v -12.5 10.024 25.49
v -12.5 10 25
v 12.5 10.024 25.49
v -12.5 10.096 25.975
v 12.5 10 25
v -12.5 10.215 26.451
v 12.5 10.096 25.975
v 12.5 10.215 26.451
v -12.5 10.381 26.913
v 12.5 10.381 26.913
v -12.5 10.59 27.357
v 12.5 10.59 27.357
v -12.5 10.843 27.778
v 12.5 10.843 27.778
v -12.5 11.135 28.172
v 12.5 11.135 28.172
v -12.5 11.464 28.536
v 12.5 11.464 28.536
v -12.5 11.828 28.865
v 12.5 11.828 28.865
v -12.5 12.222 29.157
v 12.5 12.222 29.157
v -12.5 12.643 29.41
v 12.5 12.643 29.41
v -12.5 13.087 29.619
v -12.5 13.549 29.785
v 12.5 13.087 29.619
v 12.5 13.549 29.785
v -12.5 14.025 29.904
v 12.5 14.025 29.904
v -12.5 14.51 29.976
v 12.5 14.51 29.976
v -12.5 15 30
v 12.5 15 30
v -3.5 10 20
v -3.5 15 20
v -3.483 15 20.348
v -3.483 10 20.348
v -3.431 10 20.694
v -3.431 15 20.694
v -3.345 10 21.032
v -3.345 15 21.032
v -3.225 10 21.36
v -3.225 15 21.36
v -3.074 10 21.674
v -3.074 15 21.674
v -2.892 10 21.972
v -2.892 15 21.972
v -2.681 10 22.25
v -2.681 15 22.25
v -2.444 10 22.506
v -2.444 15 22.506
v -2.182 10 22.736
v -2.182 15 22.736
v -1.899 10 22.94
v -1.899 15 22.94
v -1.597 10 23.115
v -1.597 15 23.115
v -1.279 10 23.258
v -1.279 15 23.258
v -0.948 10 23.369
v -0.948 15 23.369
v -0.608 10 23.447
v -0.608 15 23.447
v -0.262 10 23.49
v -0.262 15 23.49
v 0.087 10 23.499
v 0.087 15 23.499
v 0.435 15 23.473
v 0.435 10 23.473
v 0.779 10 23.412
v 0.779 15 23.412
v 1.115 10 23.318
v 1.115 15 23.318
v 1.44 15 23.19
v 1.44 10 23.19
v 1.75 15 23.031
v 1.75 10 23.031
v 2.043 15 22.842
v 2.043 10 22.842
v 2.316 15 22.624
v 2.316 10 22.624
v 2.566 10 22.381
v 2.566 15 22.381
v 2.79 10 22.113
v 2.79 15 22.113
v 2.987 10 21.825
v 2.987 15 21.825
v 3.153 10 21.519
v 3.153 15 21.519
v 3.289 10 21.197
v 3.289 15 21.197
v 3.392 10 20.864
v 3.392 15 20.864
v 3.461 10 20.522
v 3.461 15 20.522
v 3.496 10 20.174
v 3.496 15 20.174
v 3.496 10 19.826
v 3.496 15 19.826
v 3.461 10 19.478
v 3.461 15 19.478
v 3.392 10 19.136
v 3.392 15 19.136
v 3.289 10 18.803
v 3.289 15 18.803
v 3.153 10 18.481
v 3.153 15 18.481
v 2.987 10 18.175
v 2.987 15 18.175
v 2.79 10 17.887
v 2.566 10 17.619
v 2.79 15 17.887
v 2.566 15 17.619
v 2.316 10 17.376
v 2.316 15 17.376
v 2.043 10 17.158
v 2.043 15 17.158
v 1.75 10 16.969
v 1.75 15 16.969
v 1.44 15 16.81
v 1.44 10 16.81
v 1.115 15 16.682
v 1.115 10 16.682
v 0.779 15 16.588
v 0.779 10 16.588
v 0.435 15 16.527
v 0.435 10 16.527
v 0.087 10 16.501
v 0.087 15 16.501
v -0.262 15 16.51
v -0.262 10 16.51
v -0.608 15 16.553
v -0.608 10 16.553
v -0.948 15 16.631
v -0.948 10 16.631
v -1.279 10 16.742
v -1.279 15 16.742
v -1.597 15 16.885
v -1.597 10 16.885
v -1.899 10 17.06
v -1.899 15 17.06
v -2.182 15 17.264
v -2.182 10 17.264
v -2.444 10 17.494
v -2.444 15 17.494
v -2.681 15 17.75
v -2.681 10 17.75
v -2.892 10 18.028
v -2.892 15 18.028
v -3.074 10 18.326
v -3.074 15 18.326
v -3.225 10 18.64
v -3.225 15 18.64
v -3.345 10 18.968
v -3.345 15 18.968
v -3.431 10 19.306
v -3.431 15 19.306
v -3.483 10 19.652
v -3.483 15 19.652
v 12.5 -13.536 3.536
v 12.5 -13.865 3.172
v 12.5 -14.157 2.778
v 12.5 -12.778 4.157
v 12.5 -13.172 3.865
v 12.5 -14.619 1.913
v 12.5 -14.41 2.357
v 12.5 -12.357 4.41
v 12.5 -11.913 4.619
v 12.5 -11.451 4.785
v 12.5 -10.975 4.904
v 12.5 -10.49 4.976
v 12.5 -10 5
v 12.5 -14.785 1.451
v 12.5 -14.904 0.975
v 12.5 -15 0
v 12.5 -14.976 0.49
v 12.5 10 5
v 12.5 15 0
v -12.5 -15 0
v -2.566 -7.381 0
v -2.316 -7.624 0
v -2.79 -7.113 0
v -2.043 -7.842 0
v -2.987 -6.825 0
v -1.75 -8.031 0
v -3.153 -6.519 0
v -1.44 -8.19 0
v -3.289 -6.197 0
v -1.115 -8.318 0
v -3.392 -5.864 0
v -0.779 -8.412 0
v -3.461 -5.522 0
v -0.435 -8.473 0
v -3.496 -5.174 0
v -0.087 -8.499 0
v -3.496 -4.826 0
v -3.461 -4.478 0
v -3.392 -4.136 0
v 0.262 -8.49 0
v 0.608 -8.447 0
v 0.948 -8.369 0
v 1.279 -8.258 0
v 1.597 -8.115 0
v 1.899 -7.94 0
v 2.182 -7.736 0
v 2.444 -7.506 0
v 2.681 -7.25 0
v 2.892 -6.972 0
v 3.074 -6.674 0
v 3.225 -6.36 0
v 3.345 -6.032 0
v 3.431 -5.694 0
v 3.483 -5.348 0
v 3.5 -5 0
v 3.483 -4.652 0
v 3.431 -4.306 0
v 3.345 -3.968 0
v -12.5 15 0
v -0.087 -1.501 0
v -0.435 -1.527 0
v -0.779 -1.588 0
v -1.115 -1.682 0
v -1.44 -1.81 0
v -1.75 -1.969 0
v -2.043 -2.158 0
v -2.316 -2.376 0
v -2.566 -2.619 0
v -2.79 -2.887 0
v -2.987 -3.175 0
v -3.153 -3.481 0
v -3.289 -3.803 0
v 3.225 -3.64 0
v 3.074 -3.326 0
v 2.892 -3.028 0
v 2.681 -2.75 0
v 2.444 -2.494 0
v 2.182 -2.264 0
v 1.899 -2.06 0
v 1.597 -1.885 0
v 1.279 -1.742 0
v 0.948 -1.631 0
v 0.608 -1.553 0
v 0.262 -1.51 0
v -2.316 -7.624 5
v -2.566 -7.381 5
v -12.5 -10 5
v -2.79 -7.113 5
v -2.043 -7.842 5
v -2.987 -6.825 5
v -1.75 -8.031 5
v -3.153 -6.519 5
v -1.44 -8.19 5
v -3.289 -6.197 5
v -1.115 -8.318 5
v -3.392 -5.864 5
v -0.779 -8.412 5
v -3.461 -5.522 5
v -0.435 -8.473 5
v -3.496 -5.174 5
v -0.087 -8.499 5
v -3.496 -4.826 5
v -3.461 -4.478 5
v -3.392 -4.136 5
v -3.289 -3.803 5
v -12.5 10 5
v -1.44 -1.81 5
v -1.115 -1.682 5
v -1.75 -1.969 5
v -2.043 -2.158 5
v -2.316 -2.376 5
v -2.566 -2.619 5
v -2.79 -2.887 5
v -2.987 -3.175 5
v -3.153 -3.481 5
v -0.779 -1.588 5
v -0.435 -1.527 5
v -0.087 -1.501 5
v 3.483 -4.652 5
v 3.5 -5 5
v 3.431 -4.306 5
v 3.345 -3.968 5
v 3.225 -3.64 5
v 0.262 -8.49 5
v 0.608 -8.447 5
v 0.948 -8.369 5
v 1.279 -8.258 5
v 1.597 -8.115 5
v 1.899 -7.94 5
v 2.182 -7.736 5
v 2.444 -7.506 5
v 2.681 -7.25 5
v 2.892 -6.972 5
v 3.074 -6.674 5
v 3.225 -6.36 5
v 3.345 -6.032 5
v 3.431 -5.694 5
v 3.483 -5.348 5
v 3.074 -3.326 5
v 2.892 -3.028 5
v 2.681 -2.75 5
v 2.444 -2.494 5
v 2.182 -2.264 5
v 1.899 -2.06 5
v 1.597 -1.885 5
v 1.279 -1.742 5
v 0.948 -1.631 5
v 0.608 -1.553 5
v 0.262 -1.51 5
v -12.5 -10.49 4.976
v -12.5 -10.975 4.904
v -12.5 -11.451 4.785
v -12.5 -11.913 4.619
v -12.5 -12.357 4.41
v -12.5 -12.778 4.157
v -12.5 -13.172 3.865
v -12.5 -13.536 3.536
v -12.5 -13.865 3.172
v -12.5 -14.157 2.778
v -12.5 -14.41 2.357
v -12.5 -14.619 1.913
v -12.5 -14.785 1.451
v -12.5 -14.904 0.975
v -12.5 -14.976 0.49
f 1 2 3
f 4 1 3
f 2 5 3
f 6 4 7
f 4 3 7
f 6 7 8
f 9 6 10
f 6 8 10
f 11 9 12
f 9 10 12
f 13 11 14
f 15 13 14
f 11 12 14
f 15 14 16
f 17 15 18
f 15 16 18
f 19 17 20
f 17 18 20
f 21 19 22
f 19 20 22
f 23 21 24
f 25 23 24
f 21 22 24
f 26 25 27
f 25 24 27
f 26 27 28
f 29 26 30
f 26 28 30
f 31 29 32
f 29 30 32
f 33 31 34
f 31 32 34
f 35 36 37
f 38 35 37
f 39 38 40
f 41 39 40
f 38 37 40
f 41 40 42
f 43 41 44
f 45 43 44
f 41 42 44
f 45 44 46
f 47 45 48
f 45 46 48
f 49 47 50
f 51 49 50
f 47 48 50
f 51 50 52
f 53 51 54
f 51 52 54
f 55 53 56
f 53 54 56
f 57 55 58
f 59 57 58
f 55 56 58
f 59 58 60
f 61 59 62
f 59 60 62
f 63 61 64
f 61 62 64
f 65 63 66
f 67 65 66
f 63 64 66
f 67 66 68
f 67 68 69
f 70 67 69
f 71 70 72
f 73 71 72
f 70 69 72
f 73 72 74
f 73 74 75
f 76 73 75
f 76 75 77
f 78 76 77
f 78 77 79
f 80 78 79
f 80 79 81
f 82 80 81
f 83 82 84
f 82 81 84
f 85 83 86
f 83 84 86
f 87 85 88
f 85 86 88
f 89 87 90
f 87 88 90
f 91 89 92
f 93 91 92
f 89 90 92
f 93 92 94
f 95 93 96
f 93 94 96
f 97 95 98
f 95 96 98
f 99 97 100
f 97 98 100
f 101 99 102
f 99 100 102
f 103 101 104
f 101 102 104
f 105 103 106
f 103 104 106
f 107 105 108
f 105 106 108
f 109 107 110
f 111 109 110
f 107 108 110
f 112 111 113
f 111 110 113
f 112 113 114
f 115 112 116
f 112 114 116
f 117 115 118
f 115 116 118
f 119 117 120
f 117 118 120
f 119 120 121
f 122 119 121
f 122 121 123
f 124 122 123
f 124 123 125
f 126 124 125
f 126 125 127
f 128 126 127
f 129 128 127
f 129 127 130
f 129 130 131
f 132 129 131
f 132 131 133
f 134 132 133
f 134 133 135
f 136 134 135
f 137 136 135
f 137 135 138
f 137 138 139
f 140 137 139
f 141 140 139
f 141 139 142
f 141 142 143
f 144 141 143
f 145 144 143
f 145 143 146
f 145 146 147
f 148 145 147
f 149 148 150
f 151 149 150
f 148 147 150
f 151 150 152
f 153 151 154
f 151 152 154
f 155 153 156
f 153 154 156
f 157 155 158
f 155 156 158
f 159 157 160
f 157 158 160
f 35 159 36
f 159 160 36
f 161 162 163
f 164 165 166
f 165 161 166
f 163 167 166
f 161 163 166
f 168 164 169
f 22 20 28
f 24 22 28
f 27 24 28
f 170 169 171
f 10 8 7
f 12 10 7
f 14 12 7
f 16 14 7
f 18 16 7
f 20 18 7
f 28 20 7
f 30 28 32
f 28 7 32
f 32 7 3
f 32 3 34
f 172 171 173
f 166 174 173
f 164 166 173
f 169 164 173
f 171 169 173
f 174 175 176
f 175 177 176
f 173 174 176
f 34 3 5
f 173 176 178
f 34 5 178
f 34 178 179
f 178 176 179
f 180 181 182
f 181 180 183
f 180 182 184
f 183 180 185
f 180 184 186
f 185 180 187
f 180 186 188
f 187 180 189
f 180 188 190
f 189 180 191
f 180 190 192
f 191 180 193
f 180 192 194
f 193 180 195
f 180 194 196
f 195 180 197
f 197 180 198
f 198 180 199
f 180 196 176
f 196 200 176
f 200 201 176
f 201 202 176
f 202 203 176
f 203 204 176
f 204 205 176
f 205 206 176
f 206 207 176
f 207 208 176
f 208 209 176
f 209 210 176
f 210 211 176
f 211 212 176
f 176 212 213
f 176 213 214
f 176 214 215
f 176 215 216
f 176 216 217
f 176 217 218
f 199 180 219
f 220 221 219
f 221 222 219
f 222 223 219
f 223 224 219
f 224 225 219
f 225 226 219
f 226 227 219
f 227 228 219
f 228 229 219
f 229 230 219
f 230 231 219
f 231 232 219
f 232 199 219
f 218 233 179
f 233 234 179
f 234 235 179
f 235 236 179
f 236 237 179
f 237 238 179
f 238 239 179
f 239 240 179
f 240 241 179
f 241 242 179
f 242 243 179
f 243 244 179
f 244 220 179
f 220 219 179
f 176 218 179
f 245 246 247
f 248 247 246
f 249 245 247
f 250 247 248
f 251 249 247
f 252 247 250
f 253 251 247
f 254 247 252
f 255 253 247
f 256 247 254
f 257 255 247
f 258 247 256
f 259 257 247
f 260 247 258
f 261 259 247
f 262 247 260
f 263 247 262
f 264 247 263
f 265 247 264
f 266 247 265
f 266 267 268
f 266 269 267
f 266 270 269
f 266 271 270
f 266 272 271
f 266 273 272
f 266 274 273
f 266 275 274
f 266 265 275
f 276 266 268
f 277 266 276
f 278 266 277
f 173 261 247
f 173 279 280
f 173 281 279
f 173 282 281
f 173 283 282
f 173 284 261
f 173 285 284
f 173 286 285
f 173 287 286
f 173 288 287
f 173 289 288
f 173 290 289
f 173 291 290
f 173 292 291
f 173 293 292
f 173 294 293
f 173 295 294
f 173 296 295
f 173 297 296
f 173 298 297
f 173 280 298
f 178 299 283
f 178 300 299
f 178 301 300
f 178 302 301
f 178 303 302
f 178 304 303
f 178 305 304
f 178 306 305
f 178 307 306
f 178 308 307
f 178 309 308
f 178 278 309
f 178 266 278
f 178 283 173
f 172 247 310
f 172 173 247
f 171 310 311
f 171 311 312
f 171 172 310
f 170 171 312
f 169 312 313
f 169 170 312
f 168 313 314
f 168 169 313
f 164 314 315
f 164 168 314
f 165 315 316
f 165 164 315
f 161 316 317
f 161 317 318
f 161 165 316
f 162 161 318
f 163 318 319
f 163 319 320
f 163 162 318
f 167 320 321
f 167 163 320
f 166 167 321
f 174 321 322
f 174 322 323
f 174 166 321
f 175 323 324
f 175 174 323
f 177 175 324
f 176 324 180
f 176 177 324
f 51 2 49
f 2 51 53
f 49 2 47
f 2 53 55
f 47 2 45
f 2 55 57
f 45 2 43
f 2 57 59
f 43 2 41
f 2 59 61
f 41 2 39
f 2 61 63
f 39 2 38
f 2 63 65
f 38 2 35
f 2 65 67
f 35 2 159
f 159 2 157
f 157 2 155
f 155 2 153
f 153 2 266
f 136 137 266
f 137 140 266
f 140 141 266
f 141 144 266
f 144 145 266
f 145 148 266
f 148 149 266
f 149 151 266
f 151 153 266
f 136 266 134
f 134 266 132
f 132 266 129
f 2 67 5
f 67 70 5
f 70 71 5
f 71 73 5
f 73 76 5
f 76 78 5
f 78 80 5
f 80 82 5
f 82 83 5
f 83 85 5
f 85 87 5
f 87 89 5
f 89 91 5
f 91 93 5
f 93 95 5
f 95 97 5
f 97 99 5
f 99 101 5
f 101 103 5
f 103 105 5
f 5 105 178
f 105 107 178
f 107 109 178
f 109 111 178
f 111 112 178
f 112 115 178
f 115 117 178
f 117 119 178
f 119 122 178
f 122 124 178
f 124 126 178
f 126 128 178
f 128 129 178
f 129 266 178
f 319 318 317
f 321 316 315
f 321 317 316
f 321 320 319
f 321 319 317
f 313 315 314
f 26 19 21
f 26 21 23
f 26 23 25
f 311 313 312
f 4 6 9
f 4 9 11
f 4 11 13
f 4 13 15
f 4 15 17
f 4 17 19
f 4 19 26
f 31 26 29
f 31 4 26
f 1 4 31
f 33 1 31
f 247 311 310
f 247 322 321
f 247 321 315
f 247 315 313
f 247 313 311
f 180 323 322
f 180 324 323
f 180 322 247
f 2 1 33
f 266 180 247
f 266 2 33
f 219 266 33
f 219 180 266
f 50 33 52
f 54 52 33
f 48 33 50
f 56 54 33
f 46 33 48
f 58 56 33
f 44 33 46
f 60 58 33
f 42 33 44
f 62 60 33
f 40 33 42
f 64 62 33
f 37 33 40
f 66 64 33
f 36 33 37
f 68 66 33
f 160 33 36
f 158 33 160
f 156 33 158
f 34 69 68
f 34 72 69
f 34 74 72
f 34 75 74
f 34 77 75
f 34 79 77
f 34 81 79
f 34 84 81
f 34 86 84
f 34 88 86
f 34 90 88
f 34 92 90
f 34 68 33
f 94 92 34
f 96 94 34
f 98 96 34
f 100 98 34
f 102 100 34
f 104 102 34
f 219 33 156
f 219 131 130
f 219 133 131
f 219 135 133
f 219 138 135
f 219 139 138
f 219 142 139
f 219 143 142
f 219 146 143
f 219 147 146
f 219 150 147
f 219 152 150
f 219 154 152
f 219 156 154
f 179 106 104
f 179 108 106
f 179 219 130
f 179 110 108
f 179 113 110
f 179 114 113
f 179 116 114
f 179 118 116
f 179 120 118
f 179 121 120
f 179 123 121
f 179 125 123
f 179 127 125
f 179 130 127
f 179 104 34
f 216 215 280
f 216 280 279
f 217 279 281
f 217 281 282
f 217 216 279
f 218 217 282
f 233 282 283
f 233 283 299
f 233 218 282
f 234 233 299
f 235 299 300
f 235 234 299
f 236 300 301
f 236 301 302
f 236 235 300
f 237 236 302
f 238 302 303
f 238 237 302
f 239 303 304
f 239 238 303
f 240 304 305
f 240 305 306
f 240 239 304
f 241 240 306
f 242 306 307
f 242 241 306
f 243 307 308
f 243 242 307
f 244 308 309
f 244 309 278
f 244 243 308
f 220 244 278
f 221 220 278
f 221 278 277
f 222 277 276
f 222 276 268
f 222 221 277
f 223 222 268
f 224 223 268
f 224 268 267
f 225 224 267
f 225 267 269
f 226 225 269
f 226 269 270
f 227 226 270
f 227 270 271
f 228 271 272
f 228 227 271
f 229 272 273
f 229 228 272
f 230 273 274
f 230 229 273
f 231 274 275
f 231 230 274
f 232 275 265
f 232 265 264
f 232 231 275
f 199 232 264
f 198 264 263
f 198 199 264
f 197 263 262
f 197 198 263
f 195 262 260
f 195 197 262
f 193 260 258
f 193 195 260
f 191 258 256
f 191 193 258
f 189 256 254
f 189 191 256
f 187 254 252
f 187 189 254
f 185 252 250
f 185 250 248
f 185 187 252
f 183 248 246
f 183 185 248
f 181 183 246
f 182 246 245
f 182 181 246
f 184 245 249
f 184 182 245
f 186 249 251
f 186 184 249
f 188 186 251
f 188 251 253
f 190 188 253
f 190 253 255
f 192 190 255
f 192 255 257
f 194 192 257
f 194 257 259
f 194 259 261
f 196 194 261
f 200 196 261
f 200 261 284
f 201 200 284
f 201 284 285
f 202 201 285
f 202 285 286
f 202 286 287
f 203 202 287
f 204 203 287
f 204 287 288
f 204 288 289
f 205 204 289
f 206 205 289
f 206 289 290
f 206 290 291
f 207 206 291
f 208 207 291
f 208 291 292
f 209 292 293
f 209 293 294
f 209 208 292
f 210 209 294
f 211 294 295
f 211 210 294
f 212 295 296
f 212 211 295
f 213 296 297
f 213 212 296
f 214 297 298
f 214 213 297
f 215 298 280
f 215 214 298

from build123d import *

# Parameters (mm, degrees)
F0_W     = 25
F0_H     = 25
F0_R     = 3.5
F1_DEPTH = 5
F0_H_2   = 5
F2_DEPTH = 30
F3_R     = 3.5
F4_DEPTH = 5
F5_R     = 4.99999
F6_R     = 4.99999


# Not quite as in the source:
# - a fillet or chamfer is up to 0.001 mm smaller than in the source, because OpenCascade refuses the exact size


with BuildPart() as f1:
    # F0 (on Top) → F1 (new body)
    with BuildSketch(Plane.XY):
        with Locations((0, -2.5)):
            Rectangle(F0_W, F0_H)
        with Locations((0, -5)):
            Circle(F0_R, mode=Mode.SUBTRACT)
    extrude(amount=F1_DEPTH)

    # F0 (on Top) → F2 (join)
    with BuildSketch(Plane.XY):
        with Locations((0, 12.5)):
            Rectangle(F0_W, F0_H_2)
    extrude(amount=F2_DEPTH)

    # F3 (on face) → F4 (cut)
    with BuildSketch(Plane(origin=(0, 15, 0), x_dir=(-1, 0, 0), z_dir=(0, 1, 0))):
        with Locations((0, 20)):
            Circle(F3_R)
    extrude(amount=-F4_DEPTH, mode=Mode.SUBTRACT)

    # F5 (radius 5 in the source; OpenCascade refuses exactly that, so slightly less here)
    f5_edges = [f1.edges().sort_by_distance(p)[0] for p in [
        (0, 10, 30),
    ]]
    fillet(f5_edges, radius=F5_R)

    # F6 (radius 5 in the source; OpenCascade refuses exactly that, so slightly less here)
    f6_edges = [f1.edges().sort_by_distance(p)[0] for p in [
        (0, -15, 5),
    ]]
    fillet(f6_edges, radius=F6_R)


solid = f1.part
